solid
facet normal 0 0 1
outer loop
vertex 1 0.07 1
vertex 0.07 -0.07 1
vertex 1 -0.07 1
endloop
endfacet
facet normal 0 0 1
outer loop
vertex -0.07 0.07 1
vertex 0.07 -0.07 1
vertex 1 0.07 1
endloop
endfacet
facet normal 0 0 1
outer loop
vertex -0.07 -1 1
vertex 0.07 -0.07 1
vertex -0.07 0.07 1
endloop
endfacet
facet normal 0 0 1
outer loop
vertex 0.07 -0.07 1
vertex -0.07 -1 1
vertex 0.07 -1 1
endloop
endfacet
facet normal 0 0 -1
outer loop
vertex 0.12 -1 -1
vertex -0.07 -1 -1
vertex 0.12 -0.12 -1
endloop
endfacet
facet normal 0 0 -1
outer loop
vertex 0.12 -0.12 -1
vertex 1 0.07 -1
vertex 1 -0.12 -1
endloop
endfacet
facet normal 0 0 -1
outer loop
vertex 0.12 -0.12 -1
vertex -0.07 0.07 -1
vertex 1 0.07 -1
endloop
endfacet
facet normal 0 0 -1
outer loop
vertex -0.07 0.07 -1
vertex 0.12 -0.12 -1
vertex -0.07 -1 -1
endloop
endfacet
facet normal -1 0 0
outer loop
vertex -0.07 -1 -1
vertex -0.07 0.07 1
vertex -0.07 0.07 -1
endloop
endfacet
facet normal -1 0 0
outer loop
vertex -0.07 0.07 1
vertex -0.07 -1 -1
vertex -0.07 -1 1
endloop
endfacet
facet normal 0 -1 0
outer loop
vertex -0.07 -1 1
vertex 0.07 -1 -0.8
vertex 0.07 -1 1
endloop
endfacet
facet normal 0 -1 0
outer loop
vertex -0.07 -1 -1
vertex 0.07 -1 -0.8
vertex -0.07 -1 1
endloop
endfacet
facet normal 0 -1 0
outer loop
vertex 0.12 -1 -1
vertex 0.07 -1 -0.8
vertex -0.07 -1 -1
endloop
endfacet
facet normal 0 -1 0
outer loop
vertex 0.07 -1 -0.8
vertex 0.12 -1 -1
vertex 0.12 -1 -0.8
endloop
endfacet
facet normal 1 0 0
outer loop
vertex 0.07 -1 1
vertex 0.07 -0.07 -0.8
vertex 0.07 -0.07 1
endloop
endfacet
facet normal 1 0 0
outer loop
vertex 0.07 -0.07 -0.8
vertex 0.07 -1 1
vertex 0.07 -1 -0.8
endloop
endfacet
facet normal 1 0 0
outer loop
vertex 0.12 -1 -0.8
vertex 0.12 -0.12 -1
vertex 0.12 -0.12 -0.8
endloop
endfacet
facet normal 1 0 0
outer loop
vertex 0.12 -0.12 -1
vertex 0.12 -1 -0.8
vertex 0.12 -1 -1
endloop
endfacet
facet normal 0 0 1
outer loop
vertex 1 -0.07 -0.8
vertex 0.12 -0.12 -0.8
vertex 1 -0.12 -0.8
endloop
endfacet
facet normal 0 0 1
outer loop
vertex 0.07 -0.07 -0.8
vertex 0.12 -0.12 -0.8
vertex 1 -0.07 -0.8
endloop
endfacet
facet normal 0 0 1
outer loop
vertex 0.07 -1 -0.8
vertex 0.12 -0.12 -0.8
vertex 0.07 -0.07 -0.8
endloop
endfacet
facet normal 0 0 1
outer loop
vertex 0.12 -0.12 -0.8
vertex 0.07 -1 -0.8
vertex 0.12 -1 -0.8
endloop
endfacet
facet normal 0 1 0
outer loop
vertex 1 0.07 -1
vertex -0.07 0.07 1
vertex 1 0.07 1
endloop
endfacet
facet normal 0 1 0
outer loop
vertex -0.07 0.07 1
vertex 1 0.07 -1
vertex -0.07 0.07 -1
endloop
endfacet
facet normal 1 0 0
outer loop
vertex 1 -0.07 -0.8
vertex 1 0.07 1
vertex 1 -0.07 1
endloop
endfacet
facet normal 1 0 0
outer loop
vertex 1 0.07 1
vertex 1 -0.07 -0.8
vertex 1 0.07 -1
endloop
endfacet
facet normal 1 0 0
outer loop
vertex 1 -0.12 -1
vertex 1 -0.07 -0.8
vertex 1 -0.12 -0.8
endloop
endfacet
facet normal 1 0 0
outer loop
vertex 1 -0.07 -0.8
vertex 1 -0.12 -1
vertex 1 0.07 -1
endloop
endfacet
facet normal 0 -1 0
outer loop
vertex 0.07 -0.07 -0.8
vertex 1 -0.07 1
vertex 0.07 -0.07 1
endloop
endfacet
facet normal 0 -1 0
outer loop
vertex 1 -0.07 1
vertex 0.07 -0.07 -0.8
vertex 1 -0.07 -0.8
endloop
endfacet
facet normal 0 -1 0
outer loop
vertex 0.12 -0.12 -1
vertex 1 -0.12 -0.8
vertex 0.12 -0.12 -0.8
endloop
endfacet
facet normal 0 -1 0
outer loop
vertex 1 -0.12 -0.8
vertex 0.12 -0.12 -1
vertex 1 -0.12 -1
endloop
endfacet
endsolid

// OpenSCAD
module Wall_02(rot = 0){

    module Wall_01(){
        translate([-0.06,0,0])
        color("white")
        cube([0.02,1,2], center= true);
        
        color("#295f48")
        translate([0.06,0,0])
        color("white")
        cube([0.02,1,2], center= true);
        
        
        color("#b2b2b2")
        cube([0.1,1,2], center= true);
        
        translate([0.095,0,-0.9])    
        color("gray")
        cube([0.05,1,0.2], center= true);
    }

    rotate([0,0,rot * 90]){
    union(){
    translate([0,-0.5,0])
    Wall_01();

    translate([0.5,0,0])
    rotate([0,0,-90])
    Wall_01();

    }

    color("white")
    translate([-0.035,0.035,0])
    rotate([0,0,0])
    cube([0.07,0.07,2], center= true);

    }
}


Wall_02(rot = 0);

// Written by Nicolì Angelo (Gengio) 2024: 
// MIT License

//Permission is hereby granted, free of charge, to any person obtaining a copy of this software and associated documentation files (the "Software"), to deal in the Software without restriction, including without limitation the rights to use, copy, modify, merge, publish, distribute, sublicense, and/or sell copies of the Software, and to permit persons to whom the Software is furnished to do so, subject to the following conditions:

//The above copyright notice and this permission notice shall be included in all copies or substantial portions of the Software.

//THE SOFTWARE IS PROVIDED "AS IS", WITHOUT WARRANTY OF ANY KIND, EXPRESS OR IMPLIED, INCLUDING BUT NOT LIMITED TO THE WARRANTIES OF MERCHANTABILITY, FITNESS FOR A PARTICULAR PURPOSE AND NONINFRINGEMENT. IN NO EVENT SHALL THE AUTHORS OR COPYRIGHT HOLDERS BE LIABLE FOR ANY CLAIM, DAMAGES OR OTHER LIABILITY, WHETHER IN AN ACTION OF CONTRACT, TORT OR OTHERWISE, ARISING FROM, OUT OF OR IN CONNECTION WITH THE SOFTWARE OR THE USE OR OTHER DEALINGS IN THE SOFTWARE.
